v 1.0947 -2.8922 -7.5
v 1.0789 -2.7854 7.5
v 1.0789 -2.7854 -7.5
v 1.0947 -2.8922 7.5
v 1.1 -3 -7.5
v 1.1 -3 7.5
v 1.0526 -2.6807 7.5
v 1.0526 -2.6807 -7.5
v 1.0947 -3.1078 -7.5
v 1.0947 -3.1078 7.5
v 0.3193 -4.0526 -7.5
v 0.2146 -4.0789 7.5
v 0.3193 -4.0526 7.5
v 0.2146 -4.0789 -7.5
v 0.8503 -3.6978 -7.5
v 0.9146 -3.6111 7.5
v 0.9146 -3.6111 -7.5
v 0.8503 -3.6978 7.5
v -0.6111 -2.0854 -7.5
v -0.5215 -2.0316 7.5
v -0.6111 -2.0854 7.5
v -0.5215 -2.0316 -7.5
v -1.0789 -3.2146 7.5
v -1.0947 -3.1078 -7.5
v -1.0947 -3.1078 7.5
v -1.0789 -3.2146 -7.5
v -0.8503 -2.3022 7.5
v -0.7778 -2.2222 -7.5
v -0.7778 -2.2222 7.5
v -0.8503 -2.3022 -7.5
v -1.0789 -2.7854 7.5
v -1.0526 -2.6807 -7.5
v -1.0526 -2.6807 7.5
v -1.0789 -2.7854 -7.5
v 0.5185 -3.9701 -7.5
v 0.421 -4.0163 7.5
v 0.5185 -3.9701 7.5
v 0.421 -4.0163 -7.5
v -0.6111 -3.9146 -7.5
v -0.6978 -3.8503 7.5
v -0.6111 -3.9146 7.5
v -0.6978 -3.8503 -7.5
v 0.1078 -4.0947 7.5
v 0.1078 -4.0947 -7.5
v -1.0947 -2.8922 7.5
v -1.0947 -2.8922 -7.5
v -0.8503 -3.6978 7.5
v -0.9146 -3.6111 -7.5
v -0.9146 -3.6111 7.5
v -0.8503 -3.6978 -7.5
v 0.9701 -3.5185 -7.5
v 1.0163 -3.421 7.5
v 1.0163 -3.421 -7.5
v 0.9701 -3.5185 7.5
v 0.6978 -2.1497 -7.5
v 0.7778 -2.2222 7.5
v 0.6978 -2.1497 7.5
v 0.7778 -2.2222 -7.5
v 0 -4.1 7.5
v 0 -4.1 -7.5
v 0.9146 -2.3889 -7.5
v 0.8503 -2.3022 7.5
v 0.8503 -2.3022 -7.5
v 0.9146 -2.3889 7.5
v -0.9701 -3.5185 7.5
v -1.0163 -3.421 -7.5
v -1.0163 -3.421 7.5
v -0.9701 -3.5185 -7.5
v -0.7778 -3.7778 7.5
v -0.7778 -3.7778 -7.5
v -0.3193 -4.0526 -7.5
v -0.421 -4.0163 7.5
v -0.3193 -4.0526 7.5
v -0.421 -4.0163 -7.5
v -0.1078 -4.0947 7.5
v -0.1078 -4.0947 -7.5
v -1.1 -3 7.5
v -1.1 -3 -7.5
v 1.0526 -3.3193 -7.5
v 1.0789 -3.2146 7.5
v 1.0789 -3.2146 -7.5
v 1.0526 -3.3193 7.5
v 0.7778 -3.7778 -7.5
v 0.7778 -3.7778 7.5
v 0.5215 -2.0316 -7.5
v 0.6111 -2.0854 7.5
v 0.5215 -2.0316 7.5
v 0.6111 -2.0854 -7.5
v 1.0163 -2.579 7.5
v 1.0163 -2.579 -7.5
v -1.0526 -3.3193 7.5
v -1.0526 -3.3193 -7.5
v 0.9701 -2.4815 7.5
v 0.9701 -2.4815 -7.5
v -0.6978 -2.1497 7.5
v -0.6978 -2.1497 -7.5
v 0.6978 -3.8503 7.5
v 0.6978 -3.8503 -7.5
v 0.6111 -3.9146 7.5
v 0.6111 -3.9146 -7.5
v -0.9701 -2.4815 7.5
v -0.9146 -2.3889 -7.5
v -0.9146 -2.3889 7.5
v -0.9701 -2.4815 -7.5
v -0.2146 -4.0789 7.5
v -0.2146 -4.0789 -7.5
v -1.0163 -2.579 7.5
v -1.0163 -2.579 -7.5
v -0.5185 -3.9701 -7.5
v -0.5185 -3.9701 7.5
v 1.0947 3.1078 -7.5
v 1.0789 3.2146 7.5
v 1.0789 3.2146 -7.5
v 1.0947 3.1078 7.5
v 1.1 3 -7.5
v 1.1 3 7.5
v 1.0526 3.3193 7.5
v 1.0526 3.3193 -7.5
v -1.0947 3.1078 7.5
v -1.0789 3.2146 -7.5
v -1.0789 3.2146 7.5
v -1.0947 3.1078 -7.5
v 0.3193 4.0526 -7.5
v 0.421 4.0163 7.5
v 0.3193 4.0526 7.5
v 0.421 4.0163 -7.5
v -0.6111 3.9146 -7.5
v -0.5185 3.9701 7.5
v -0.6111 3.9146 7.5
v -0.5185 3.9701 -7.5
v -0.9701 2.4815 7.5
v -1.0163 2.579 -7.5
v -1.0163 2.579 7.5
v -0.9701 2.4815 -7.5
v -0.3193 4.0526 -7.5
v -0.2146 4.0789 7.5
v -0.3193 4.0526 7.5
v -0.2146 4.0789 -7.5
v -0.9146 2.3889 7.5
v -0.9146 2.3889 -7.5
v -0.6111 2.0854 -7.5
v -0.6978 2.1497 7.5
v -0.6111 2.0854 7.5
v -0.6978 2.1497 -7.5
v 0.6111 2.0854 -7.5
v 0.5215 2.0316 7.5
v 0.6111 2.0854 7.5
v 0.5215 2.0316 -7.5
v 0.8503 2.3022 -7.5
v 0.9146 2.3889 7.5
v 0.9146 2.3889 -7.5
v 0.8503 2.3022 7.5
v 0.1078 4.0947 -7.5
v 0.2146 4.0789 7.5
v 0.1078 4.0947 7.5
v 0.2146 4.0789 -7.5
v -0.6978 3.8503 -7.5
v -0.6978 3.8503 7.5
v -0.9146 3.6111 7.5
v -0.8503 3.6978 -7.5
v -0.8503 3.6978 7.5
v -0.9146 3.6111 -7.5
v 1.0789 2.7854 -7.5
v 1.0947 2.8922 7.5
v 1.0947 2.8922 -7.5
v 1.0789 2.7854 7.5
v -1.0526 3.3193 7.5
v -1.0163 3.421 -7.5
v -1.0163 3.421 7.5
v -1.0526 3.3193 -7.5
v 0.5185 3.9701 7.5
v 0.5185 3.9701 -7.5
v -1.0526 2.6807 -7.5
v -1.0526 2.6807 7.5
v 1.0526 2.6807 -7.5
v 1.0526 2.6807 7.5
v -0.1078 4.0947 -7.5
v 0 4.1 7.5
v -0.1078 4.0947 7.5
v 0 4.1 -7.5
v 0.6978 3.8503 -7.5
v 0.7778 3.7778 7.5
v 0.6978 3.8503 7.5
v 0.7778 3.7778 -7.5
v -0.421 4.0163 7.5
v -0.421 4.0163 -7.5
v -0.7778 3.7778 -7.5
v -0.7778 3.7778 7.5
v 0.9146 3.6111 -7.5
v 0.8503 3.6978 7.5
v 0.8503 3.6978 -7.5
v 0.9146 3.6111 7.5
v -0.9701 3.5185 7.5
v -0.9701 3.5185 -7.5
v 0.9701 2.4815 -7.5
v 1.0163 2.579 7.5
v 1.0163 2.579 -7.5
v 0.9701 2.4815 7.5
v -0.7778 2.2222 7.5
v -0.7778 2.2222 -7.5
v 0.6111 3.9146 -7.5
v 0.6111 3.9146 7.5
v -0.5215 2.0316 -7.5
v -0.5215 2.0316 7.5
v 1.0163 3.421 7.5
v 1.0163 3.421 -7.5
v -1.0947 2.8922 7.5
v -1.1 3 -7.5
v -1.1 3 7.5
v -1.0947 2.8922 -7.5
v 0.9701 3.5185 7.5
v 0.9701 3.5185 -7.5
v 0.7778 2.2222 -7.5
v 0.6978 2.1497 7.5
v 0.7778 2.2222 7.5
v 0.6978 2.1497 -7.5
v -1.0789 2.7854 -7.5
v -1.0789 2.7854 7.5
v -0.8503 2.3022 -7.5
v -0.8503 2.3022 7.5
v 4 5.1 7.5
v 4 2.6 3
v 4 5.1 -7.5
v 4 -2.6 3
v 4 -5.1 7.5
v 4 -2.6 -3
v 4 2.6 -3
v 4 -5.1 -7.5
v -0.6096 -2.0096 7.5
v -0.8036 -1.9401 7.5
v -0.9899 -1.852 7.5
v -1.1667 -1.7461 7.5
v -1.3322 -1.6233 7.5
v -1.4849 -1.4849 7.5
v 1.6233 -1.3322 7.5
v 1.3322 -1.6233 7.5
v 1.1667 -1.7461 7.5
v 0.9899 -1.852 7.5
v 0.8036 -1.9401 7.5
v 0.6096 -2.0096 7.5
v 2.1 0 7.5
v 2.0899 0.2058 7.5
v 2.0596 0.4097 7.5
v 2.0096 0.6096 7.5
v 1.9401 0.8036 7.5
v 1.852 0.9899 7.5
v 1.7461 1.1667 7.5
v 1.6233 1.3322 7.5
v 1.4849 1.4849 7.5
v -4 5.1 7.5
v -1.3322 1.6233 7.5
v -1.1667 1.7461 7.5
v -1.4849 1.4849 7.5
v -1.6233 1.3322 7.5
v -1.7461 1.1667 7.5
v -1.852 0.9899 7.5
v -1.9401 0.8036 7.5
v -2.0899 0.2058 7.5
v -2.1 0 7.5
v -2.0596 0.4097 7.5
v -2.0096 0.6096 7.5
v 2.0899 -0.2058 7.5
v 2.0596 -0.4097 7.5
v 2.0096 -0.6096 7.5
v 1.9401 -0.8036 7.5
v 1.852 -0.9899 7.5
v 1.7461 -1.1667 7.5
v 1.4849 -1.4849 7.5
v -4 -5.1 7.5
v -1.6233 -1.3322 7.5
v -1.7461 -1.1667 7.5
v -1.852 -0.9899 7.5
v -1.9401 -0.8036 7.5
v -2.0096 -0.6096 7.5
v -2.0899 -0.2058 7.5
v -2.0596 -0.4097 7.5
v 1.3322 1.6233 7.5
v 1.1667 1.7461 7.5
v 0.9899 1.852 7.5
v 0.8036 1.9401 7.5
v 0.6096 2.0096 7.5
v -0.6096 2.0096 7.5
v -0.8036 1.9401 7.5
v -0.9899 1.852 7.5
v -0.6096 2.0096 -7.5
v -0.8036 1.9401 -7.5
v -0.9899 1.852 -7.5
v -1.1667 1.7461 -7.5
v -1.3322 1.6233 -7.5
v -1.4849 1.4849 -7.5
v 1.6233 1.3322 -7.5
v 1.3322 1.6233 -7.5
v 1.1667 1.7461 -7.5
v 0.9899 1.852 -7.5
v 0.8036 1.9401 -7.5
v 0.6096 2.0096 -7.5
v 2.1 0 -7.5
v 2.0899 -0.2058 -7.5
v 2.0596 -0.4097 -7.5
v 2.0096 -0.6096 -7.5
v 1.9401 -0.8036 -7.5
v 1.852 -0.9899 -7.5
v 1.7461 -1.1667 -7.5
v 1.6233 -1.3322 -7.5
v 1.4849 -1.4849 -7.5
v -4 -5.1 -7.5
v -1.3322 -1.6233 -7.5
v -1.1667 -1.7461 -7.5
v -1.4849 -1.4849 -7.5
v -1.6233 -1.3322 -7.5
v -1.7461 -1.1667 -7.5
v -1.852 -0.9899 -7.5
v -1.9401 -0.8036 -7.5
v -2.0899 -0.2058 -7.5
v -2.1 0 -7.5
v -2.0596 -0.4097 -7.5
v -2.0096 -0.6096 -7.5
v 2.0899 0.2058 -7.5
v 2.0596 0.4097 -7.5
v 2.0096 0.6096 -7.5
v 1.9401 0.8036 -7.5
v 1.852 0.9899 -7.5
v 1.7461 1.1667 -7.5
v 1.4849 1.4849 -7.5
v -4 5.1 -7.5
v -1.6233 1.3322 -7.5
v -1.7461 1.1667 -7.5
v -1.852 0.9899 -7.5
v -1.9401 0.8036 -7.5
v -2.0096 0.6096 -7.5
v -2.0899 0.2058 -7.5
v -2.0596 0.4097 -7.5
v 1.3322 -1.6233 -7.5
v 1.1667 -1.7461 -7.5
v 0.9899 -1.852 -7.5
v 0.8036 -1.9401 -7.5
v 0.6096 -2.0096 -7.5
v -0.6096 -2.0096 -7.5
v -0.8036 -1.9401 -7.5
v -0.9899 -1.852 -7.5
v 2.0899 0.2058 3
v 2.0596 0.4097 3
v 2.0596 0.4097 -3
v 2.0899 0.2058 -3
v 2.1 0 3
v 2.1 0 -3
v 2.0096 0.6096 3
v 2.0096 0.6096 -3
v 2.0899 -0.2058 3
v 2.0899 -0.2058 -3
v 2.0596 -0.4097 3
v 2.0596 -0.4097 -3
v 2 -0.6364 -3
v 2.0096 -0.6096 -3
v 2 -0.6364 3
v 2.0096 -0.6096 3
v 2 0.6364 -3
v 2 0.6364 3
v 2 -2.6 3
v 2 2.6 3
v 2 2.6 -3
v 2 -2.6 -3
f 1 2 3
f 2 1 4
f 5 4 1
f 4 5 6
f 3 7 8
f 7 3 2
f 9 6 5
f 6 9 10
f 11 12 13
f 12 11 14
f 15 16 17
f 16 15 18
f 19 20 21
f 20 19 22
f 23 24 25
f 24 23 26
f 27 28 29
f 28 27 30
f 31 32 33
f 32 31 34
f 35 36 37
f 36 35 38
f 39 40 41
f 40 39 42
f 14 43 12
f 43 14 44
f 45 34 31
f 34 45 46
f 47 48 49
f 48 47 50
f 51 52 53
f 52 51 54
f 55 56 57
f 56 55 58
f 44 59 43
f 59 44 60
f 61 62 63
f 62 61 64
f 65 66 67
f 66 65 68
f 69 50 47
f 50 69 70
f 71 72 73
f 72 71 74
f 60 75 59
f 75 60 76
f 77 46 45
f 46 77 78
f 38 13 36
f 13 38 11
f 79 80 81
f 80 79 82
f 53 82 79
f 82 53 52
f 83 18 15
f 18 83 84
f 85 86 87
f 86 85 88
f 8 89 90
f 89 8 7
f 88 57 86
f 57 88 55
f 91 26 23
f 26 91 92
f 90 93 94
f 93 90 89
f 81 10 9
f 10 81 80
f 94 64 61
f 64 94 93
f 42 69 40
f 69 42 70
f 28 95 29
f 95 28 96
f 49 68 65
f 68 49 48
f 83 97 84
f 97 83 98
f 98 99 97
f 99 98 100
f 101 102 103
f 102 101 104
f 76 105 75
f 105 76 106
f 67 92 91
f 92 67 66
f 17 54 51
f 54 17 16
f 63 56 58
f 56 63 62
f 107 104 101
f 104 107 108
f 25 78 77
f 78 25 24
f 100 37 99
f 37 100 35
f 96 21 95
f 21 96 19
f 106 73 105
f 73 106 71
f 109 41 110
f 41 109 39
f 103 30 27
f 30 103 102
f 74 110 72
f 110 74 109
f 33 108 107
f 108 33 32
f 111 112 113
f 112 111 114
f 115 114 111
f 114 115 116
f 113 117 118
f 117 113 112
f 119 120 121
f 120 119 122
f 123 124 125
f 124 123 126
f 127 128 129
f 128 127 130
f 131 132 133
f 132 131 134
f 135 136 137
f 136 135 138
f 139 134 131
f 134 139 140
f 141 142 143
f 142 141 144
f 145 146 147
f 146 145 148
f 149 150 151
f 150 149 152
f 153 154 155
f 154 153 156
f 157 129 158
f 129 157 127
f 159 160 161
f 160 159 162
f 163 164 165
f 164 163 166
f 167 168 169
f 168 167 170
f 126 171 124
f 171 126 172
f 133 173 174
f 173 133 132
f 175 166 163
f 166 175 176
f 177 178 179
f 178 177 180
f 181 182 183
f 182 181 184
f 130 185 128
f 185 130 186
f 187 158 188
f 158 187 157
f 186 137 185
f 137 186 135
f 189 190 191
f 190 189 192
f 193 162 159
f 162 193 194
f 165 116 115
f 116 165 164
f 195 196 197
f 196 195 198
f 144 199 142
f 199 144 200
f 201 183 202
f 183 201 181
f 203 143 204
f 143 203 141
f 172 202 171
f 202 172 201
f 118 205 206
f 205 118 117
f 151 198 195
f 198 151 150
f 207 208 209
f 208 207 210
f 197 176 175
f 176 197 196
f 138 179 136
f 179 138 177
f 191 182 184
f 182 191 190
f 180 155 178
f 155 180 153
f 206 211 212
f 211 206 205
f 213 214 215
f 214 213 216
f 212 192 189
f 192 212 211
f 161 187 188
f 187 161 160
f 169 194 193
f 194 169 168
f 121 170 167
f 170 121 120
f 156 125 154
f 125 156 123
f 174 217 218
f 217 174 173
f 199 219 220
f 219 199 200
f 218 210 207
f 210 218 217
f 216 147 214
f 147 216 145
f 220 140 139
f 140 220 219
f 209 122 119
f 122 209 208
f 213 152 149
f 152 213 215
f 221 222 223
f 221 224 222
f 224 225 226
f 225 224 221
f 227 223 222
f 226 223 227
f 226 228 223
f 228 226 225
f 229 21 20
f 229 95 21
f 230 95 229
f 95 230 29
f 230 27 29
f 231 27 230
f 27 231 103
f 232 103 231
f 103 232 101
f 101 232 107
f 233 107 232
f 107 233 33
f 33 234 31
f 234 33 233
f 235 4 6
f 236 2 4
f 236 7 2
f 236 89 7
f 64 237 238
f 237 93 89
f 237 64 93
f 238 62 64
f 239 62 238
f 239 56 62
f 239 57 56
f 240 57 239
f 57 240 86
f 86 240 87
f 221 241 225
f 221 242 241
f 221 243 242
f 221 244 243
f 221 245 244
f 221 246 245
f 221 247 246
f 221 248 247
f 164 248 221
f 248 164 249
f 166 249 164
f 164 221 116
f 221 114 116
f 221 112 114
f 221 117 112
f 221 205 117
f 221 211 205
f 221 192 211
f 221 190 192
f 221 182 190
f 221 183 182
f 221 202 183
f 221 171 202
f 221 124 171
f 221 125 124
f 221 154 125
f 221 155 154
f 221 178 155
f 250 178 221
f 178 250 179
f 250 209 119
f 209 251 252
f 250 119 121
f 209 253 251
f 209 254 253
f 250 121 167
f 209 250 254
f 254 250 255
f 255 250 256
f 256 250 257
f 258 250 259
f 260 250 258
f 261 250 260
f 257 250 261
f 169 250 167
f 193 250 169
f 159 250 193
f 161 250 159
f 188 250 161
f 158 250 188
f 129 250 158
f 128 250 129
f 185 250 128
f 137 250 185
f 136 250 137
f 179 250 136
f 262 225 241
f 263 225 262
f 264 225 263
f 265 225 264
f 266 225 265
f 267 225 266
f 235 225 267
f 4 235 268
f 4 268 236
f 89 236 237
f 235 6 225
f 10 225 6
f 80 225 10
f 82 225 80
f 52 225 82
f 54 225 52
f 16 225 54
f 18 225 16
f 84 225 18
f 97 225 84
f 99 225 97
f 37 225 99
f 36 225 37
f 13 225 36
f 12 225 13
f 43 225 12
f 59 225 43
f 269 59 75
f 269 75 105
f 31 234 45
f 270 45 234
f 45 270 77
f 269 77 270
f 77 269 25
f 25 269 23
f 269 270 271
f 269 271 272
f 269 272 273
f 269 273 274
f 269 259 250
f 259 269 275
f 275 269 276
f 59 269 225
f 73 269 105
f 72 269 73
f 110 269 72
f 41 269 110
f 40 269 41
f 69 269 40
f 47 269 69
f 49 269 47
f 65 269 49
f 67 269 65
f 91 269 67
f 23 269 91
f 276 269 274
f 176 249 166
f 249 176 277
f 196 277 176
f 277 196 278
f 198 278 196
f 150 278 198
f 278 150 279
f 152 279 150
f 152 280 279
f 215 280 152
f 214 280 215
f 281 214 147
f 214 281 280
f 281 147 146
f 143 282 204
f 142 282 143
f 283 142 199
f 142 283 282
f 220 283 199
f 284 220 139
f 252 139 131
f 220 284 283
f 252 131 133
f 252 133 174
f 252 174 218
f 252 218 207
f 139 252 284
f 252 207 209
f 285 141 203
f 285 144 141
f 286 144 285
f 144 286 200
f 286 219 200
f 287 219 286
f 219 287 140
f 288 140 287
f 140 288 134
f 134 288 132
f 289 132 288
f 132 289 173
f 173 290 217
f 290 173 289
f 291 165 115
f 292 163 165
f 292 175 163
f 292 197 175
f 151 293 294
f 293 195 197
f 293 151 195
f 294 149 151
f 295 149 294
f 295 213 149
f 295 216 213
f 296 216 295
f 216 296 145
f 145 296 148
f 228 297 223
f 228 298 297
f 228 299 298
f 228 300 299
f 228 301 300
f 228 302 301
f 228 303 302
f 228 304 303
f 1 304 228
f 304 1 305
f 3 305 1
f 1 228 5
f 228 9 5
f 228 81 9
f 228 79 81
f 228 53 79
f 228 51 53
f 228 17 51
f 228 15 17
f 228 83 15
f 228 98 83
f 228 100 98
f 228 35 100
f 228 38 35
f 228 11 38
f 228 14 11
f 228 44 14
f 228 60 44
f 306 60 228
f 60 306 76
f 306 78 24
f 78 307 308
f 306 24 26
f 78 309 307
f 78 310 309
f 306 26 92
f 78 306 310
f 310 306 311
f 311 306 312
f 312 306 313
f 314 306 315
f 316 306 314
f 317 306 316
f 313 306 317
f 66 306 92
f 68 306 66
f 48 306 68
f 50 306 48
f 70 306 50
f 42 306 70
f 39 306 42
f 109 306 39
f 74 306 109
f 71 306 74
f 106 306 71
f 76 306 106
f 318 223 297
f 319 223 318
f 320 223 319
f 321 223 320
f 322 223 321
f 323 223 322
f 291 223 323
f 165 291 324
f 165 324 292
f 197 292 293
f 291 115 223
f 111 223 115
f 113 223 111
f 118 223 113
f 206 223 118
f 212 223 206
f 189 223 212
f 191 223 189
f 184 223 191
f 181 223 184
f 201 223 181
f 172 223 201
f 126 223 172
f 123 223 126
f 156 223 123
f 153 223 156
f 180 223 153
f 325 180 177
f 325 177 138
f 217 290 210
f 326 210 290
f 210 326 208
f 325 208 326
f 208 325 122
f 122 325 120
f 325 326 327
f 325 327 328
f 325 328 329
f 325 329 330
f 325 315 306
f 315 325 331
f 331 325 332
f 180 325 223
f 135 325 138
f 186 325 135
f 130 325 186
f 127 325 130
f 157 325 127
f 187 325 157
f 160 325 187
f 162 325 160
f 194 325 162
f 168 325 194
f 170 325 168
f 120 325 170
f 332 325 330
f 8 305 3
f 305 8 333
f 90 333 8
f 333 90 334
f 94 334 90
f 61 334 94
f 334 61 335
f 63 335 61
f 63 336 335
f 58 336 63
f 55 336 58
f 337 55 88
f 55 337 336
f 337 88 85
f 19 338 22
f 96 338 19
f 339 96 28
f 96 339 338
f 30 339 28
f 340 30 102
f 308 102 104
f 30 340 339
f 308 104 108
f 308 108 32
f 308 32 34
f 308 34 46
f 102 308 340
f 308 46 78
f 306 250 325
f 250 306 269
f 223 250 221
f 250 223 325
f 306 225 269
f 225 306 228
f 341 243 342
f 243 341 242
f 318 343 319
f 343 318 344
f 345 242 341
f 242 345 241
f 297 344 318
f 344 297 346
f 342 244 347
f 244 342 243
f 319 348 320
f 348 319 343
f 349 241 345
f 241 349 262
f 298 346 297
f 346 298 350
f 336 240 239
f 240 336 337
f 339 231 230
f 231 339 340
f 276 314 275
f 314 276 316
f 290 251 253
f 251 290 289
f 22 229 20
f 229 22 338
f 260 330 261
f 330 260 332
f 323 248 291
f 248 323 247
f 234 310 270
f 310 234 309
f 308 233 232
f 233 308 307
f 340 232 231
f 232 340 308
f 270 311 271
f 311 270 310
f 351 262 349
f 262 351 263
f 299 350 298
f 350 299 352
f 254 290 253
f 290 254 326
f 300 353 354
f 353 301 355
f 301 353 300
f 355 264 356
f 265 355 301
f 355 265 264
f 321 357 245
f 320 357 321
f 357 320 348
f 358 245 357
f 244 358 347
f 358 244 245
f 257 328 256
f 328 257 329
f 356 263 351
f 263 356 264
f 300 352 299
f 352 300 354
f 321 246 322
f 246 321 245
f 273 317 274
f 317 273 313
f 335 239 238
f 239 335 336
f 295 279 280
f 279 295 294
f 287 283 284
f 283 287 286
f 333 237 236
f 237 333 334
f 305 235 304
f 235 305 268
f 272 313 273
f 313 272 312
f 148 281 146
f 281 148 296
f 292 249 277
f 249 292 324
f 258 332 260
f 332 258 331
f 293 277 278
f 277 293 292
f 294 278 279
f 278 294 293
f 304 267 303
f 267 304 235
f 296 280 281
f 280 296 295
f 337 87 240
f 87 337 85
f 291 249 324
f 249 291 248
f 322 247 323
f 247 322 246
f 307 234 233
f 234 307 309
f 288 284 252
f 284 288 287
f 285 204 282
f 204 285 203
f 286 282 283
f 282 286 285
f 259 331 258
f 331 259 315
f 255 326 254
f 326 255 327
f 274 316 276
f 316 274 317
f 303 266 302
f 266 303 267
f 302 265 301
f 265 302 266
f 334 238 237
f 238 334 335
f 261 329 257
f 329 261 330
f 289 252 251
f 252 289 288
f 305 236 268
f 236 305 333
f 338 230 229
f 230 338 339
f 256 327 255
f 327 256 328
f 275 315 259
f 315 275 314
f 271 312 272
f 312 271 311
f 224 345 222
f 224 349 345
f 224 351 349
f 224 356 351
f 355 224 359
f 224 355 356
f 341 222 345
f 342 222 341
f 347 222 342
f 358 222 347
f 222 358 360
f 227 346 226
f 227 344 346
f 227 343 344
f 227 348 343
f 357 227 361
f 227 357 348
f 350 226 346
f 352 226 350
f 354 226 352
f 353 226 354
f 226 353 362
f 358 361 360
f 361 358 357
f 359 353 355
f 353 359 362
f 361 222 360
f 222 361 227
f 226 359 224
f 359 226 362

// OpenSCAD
// Leadscrew nut housing: 8.0mm x 10.2mm x 15.0mm block with through-bore and mounting holes
// Overall dimensions are preserved exactly by only subtracting features.

$fn = 64;

width_mm  = 8.0;   //[4.0:16.0:0.1]  // X
depth_mm  = 10.2;  //[5.1:20.4:0.1]  // Y
height_mm = 15.0;  //[7.5:30.0:0.1]  // Z

// Feature parameters (typical small leadscrew nut housing)
bore_d_mm        = 4.2;   // through-hole for leadscrew
mount_hole_d_mm  = 2.2;   // two mounting through-holes
mount_spacing_mm = 6.0;   // center-to-center along Y
edge_margin_mm   = 1.2;   // keep holes away from edges

eps = 0.02;

module leadscrew_nut_housing() {
    difference() {
        // Main block (exact overall size)
        cube([width_mm, depth_mm, height_mm], center=true);

        // Central through-bore along Z
        cylinder(d=bore_d_mm, h=height_mm + 2*eps, center=true);

        // Two mounting through-holes along Z, placed symmetrically along Y
        // Ensure spacing fits within depth with margin
        spacing = min(mount_spacing_mm, max(0, depth_mm - 2*edge_margin_mm));
        for (y = [-spacing/2, spacing/2]) {
            translate([0, y, 0])
                cylinder(d=mount_hole_d_mm, h=height_mm + 2*eps, center=true);
        }

        // Small side relief slot to suggest nut capture (does not change outer size)
        // Slot opens to +X face and intersects the central bore.
        slot_w = min(2.0, width_mm - 2*edge_margin_mm);
        slot_h = min(6.0, height_mm - 2*edge_margin_mm);
        translate([width_mm/2 - slot_w/2 + eps, 0, 0])
            cube([slot_w + 2*eps, bore_d_mm + 1.0, slot_h], center=true);
    }
}

leadscrew_nut_housing();
